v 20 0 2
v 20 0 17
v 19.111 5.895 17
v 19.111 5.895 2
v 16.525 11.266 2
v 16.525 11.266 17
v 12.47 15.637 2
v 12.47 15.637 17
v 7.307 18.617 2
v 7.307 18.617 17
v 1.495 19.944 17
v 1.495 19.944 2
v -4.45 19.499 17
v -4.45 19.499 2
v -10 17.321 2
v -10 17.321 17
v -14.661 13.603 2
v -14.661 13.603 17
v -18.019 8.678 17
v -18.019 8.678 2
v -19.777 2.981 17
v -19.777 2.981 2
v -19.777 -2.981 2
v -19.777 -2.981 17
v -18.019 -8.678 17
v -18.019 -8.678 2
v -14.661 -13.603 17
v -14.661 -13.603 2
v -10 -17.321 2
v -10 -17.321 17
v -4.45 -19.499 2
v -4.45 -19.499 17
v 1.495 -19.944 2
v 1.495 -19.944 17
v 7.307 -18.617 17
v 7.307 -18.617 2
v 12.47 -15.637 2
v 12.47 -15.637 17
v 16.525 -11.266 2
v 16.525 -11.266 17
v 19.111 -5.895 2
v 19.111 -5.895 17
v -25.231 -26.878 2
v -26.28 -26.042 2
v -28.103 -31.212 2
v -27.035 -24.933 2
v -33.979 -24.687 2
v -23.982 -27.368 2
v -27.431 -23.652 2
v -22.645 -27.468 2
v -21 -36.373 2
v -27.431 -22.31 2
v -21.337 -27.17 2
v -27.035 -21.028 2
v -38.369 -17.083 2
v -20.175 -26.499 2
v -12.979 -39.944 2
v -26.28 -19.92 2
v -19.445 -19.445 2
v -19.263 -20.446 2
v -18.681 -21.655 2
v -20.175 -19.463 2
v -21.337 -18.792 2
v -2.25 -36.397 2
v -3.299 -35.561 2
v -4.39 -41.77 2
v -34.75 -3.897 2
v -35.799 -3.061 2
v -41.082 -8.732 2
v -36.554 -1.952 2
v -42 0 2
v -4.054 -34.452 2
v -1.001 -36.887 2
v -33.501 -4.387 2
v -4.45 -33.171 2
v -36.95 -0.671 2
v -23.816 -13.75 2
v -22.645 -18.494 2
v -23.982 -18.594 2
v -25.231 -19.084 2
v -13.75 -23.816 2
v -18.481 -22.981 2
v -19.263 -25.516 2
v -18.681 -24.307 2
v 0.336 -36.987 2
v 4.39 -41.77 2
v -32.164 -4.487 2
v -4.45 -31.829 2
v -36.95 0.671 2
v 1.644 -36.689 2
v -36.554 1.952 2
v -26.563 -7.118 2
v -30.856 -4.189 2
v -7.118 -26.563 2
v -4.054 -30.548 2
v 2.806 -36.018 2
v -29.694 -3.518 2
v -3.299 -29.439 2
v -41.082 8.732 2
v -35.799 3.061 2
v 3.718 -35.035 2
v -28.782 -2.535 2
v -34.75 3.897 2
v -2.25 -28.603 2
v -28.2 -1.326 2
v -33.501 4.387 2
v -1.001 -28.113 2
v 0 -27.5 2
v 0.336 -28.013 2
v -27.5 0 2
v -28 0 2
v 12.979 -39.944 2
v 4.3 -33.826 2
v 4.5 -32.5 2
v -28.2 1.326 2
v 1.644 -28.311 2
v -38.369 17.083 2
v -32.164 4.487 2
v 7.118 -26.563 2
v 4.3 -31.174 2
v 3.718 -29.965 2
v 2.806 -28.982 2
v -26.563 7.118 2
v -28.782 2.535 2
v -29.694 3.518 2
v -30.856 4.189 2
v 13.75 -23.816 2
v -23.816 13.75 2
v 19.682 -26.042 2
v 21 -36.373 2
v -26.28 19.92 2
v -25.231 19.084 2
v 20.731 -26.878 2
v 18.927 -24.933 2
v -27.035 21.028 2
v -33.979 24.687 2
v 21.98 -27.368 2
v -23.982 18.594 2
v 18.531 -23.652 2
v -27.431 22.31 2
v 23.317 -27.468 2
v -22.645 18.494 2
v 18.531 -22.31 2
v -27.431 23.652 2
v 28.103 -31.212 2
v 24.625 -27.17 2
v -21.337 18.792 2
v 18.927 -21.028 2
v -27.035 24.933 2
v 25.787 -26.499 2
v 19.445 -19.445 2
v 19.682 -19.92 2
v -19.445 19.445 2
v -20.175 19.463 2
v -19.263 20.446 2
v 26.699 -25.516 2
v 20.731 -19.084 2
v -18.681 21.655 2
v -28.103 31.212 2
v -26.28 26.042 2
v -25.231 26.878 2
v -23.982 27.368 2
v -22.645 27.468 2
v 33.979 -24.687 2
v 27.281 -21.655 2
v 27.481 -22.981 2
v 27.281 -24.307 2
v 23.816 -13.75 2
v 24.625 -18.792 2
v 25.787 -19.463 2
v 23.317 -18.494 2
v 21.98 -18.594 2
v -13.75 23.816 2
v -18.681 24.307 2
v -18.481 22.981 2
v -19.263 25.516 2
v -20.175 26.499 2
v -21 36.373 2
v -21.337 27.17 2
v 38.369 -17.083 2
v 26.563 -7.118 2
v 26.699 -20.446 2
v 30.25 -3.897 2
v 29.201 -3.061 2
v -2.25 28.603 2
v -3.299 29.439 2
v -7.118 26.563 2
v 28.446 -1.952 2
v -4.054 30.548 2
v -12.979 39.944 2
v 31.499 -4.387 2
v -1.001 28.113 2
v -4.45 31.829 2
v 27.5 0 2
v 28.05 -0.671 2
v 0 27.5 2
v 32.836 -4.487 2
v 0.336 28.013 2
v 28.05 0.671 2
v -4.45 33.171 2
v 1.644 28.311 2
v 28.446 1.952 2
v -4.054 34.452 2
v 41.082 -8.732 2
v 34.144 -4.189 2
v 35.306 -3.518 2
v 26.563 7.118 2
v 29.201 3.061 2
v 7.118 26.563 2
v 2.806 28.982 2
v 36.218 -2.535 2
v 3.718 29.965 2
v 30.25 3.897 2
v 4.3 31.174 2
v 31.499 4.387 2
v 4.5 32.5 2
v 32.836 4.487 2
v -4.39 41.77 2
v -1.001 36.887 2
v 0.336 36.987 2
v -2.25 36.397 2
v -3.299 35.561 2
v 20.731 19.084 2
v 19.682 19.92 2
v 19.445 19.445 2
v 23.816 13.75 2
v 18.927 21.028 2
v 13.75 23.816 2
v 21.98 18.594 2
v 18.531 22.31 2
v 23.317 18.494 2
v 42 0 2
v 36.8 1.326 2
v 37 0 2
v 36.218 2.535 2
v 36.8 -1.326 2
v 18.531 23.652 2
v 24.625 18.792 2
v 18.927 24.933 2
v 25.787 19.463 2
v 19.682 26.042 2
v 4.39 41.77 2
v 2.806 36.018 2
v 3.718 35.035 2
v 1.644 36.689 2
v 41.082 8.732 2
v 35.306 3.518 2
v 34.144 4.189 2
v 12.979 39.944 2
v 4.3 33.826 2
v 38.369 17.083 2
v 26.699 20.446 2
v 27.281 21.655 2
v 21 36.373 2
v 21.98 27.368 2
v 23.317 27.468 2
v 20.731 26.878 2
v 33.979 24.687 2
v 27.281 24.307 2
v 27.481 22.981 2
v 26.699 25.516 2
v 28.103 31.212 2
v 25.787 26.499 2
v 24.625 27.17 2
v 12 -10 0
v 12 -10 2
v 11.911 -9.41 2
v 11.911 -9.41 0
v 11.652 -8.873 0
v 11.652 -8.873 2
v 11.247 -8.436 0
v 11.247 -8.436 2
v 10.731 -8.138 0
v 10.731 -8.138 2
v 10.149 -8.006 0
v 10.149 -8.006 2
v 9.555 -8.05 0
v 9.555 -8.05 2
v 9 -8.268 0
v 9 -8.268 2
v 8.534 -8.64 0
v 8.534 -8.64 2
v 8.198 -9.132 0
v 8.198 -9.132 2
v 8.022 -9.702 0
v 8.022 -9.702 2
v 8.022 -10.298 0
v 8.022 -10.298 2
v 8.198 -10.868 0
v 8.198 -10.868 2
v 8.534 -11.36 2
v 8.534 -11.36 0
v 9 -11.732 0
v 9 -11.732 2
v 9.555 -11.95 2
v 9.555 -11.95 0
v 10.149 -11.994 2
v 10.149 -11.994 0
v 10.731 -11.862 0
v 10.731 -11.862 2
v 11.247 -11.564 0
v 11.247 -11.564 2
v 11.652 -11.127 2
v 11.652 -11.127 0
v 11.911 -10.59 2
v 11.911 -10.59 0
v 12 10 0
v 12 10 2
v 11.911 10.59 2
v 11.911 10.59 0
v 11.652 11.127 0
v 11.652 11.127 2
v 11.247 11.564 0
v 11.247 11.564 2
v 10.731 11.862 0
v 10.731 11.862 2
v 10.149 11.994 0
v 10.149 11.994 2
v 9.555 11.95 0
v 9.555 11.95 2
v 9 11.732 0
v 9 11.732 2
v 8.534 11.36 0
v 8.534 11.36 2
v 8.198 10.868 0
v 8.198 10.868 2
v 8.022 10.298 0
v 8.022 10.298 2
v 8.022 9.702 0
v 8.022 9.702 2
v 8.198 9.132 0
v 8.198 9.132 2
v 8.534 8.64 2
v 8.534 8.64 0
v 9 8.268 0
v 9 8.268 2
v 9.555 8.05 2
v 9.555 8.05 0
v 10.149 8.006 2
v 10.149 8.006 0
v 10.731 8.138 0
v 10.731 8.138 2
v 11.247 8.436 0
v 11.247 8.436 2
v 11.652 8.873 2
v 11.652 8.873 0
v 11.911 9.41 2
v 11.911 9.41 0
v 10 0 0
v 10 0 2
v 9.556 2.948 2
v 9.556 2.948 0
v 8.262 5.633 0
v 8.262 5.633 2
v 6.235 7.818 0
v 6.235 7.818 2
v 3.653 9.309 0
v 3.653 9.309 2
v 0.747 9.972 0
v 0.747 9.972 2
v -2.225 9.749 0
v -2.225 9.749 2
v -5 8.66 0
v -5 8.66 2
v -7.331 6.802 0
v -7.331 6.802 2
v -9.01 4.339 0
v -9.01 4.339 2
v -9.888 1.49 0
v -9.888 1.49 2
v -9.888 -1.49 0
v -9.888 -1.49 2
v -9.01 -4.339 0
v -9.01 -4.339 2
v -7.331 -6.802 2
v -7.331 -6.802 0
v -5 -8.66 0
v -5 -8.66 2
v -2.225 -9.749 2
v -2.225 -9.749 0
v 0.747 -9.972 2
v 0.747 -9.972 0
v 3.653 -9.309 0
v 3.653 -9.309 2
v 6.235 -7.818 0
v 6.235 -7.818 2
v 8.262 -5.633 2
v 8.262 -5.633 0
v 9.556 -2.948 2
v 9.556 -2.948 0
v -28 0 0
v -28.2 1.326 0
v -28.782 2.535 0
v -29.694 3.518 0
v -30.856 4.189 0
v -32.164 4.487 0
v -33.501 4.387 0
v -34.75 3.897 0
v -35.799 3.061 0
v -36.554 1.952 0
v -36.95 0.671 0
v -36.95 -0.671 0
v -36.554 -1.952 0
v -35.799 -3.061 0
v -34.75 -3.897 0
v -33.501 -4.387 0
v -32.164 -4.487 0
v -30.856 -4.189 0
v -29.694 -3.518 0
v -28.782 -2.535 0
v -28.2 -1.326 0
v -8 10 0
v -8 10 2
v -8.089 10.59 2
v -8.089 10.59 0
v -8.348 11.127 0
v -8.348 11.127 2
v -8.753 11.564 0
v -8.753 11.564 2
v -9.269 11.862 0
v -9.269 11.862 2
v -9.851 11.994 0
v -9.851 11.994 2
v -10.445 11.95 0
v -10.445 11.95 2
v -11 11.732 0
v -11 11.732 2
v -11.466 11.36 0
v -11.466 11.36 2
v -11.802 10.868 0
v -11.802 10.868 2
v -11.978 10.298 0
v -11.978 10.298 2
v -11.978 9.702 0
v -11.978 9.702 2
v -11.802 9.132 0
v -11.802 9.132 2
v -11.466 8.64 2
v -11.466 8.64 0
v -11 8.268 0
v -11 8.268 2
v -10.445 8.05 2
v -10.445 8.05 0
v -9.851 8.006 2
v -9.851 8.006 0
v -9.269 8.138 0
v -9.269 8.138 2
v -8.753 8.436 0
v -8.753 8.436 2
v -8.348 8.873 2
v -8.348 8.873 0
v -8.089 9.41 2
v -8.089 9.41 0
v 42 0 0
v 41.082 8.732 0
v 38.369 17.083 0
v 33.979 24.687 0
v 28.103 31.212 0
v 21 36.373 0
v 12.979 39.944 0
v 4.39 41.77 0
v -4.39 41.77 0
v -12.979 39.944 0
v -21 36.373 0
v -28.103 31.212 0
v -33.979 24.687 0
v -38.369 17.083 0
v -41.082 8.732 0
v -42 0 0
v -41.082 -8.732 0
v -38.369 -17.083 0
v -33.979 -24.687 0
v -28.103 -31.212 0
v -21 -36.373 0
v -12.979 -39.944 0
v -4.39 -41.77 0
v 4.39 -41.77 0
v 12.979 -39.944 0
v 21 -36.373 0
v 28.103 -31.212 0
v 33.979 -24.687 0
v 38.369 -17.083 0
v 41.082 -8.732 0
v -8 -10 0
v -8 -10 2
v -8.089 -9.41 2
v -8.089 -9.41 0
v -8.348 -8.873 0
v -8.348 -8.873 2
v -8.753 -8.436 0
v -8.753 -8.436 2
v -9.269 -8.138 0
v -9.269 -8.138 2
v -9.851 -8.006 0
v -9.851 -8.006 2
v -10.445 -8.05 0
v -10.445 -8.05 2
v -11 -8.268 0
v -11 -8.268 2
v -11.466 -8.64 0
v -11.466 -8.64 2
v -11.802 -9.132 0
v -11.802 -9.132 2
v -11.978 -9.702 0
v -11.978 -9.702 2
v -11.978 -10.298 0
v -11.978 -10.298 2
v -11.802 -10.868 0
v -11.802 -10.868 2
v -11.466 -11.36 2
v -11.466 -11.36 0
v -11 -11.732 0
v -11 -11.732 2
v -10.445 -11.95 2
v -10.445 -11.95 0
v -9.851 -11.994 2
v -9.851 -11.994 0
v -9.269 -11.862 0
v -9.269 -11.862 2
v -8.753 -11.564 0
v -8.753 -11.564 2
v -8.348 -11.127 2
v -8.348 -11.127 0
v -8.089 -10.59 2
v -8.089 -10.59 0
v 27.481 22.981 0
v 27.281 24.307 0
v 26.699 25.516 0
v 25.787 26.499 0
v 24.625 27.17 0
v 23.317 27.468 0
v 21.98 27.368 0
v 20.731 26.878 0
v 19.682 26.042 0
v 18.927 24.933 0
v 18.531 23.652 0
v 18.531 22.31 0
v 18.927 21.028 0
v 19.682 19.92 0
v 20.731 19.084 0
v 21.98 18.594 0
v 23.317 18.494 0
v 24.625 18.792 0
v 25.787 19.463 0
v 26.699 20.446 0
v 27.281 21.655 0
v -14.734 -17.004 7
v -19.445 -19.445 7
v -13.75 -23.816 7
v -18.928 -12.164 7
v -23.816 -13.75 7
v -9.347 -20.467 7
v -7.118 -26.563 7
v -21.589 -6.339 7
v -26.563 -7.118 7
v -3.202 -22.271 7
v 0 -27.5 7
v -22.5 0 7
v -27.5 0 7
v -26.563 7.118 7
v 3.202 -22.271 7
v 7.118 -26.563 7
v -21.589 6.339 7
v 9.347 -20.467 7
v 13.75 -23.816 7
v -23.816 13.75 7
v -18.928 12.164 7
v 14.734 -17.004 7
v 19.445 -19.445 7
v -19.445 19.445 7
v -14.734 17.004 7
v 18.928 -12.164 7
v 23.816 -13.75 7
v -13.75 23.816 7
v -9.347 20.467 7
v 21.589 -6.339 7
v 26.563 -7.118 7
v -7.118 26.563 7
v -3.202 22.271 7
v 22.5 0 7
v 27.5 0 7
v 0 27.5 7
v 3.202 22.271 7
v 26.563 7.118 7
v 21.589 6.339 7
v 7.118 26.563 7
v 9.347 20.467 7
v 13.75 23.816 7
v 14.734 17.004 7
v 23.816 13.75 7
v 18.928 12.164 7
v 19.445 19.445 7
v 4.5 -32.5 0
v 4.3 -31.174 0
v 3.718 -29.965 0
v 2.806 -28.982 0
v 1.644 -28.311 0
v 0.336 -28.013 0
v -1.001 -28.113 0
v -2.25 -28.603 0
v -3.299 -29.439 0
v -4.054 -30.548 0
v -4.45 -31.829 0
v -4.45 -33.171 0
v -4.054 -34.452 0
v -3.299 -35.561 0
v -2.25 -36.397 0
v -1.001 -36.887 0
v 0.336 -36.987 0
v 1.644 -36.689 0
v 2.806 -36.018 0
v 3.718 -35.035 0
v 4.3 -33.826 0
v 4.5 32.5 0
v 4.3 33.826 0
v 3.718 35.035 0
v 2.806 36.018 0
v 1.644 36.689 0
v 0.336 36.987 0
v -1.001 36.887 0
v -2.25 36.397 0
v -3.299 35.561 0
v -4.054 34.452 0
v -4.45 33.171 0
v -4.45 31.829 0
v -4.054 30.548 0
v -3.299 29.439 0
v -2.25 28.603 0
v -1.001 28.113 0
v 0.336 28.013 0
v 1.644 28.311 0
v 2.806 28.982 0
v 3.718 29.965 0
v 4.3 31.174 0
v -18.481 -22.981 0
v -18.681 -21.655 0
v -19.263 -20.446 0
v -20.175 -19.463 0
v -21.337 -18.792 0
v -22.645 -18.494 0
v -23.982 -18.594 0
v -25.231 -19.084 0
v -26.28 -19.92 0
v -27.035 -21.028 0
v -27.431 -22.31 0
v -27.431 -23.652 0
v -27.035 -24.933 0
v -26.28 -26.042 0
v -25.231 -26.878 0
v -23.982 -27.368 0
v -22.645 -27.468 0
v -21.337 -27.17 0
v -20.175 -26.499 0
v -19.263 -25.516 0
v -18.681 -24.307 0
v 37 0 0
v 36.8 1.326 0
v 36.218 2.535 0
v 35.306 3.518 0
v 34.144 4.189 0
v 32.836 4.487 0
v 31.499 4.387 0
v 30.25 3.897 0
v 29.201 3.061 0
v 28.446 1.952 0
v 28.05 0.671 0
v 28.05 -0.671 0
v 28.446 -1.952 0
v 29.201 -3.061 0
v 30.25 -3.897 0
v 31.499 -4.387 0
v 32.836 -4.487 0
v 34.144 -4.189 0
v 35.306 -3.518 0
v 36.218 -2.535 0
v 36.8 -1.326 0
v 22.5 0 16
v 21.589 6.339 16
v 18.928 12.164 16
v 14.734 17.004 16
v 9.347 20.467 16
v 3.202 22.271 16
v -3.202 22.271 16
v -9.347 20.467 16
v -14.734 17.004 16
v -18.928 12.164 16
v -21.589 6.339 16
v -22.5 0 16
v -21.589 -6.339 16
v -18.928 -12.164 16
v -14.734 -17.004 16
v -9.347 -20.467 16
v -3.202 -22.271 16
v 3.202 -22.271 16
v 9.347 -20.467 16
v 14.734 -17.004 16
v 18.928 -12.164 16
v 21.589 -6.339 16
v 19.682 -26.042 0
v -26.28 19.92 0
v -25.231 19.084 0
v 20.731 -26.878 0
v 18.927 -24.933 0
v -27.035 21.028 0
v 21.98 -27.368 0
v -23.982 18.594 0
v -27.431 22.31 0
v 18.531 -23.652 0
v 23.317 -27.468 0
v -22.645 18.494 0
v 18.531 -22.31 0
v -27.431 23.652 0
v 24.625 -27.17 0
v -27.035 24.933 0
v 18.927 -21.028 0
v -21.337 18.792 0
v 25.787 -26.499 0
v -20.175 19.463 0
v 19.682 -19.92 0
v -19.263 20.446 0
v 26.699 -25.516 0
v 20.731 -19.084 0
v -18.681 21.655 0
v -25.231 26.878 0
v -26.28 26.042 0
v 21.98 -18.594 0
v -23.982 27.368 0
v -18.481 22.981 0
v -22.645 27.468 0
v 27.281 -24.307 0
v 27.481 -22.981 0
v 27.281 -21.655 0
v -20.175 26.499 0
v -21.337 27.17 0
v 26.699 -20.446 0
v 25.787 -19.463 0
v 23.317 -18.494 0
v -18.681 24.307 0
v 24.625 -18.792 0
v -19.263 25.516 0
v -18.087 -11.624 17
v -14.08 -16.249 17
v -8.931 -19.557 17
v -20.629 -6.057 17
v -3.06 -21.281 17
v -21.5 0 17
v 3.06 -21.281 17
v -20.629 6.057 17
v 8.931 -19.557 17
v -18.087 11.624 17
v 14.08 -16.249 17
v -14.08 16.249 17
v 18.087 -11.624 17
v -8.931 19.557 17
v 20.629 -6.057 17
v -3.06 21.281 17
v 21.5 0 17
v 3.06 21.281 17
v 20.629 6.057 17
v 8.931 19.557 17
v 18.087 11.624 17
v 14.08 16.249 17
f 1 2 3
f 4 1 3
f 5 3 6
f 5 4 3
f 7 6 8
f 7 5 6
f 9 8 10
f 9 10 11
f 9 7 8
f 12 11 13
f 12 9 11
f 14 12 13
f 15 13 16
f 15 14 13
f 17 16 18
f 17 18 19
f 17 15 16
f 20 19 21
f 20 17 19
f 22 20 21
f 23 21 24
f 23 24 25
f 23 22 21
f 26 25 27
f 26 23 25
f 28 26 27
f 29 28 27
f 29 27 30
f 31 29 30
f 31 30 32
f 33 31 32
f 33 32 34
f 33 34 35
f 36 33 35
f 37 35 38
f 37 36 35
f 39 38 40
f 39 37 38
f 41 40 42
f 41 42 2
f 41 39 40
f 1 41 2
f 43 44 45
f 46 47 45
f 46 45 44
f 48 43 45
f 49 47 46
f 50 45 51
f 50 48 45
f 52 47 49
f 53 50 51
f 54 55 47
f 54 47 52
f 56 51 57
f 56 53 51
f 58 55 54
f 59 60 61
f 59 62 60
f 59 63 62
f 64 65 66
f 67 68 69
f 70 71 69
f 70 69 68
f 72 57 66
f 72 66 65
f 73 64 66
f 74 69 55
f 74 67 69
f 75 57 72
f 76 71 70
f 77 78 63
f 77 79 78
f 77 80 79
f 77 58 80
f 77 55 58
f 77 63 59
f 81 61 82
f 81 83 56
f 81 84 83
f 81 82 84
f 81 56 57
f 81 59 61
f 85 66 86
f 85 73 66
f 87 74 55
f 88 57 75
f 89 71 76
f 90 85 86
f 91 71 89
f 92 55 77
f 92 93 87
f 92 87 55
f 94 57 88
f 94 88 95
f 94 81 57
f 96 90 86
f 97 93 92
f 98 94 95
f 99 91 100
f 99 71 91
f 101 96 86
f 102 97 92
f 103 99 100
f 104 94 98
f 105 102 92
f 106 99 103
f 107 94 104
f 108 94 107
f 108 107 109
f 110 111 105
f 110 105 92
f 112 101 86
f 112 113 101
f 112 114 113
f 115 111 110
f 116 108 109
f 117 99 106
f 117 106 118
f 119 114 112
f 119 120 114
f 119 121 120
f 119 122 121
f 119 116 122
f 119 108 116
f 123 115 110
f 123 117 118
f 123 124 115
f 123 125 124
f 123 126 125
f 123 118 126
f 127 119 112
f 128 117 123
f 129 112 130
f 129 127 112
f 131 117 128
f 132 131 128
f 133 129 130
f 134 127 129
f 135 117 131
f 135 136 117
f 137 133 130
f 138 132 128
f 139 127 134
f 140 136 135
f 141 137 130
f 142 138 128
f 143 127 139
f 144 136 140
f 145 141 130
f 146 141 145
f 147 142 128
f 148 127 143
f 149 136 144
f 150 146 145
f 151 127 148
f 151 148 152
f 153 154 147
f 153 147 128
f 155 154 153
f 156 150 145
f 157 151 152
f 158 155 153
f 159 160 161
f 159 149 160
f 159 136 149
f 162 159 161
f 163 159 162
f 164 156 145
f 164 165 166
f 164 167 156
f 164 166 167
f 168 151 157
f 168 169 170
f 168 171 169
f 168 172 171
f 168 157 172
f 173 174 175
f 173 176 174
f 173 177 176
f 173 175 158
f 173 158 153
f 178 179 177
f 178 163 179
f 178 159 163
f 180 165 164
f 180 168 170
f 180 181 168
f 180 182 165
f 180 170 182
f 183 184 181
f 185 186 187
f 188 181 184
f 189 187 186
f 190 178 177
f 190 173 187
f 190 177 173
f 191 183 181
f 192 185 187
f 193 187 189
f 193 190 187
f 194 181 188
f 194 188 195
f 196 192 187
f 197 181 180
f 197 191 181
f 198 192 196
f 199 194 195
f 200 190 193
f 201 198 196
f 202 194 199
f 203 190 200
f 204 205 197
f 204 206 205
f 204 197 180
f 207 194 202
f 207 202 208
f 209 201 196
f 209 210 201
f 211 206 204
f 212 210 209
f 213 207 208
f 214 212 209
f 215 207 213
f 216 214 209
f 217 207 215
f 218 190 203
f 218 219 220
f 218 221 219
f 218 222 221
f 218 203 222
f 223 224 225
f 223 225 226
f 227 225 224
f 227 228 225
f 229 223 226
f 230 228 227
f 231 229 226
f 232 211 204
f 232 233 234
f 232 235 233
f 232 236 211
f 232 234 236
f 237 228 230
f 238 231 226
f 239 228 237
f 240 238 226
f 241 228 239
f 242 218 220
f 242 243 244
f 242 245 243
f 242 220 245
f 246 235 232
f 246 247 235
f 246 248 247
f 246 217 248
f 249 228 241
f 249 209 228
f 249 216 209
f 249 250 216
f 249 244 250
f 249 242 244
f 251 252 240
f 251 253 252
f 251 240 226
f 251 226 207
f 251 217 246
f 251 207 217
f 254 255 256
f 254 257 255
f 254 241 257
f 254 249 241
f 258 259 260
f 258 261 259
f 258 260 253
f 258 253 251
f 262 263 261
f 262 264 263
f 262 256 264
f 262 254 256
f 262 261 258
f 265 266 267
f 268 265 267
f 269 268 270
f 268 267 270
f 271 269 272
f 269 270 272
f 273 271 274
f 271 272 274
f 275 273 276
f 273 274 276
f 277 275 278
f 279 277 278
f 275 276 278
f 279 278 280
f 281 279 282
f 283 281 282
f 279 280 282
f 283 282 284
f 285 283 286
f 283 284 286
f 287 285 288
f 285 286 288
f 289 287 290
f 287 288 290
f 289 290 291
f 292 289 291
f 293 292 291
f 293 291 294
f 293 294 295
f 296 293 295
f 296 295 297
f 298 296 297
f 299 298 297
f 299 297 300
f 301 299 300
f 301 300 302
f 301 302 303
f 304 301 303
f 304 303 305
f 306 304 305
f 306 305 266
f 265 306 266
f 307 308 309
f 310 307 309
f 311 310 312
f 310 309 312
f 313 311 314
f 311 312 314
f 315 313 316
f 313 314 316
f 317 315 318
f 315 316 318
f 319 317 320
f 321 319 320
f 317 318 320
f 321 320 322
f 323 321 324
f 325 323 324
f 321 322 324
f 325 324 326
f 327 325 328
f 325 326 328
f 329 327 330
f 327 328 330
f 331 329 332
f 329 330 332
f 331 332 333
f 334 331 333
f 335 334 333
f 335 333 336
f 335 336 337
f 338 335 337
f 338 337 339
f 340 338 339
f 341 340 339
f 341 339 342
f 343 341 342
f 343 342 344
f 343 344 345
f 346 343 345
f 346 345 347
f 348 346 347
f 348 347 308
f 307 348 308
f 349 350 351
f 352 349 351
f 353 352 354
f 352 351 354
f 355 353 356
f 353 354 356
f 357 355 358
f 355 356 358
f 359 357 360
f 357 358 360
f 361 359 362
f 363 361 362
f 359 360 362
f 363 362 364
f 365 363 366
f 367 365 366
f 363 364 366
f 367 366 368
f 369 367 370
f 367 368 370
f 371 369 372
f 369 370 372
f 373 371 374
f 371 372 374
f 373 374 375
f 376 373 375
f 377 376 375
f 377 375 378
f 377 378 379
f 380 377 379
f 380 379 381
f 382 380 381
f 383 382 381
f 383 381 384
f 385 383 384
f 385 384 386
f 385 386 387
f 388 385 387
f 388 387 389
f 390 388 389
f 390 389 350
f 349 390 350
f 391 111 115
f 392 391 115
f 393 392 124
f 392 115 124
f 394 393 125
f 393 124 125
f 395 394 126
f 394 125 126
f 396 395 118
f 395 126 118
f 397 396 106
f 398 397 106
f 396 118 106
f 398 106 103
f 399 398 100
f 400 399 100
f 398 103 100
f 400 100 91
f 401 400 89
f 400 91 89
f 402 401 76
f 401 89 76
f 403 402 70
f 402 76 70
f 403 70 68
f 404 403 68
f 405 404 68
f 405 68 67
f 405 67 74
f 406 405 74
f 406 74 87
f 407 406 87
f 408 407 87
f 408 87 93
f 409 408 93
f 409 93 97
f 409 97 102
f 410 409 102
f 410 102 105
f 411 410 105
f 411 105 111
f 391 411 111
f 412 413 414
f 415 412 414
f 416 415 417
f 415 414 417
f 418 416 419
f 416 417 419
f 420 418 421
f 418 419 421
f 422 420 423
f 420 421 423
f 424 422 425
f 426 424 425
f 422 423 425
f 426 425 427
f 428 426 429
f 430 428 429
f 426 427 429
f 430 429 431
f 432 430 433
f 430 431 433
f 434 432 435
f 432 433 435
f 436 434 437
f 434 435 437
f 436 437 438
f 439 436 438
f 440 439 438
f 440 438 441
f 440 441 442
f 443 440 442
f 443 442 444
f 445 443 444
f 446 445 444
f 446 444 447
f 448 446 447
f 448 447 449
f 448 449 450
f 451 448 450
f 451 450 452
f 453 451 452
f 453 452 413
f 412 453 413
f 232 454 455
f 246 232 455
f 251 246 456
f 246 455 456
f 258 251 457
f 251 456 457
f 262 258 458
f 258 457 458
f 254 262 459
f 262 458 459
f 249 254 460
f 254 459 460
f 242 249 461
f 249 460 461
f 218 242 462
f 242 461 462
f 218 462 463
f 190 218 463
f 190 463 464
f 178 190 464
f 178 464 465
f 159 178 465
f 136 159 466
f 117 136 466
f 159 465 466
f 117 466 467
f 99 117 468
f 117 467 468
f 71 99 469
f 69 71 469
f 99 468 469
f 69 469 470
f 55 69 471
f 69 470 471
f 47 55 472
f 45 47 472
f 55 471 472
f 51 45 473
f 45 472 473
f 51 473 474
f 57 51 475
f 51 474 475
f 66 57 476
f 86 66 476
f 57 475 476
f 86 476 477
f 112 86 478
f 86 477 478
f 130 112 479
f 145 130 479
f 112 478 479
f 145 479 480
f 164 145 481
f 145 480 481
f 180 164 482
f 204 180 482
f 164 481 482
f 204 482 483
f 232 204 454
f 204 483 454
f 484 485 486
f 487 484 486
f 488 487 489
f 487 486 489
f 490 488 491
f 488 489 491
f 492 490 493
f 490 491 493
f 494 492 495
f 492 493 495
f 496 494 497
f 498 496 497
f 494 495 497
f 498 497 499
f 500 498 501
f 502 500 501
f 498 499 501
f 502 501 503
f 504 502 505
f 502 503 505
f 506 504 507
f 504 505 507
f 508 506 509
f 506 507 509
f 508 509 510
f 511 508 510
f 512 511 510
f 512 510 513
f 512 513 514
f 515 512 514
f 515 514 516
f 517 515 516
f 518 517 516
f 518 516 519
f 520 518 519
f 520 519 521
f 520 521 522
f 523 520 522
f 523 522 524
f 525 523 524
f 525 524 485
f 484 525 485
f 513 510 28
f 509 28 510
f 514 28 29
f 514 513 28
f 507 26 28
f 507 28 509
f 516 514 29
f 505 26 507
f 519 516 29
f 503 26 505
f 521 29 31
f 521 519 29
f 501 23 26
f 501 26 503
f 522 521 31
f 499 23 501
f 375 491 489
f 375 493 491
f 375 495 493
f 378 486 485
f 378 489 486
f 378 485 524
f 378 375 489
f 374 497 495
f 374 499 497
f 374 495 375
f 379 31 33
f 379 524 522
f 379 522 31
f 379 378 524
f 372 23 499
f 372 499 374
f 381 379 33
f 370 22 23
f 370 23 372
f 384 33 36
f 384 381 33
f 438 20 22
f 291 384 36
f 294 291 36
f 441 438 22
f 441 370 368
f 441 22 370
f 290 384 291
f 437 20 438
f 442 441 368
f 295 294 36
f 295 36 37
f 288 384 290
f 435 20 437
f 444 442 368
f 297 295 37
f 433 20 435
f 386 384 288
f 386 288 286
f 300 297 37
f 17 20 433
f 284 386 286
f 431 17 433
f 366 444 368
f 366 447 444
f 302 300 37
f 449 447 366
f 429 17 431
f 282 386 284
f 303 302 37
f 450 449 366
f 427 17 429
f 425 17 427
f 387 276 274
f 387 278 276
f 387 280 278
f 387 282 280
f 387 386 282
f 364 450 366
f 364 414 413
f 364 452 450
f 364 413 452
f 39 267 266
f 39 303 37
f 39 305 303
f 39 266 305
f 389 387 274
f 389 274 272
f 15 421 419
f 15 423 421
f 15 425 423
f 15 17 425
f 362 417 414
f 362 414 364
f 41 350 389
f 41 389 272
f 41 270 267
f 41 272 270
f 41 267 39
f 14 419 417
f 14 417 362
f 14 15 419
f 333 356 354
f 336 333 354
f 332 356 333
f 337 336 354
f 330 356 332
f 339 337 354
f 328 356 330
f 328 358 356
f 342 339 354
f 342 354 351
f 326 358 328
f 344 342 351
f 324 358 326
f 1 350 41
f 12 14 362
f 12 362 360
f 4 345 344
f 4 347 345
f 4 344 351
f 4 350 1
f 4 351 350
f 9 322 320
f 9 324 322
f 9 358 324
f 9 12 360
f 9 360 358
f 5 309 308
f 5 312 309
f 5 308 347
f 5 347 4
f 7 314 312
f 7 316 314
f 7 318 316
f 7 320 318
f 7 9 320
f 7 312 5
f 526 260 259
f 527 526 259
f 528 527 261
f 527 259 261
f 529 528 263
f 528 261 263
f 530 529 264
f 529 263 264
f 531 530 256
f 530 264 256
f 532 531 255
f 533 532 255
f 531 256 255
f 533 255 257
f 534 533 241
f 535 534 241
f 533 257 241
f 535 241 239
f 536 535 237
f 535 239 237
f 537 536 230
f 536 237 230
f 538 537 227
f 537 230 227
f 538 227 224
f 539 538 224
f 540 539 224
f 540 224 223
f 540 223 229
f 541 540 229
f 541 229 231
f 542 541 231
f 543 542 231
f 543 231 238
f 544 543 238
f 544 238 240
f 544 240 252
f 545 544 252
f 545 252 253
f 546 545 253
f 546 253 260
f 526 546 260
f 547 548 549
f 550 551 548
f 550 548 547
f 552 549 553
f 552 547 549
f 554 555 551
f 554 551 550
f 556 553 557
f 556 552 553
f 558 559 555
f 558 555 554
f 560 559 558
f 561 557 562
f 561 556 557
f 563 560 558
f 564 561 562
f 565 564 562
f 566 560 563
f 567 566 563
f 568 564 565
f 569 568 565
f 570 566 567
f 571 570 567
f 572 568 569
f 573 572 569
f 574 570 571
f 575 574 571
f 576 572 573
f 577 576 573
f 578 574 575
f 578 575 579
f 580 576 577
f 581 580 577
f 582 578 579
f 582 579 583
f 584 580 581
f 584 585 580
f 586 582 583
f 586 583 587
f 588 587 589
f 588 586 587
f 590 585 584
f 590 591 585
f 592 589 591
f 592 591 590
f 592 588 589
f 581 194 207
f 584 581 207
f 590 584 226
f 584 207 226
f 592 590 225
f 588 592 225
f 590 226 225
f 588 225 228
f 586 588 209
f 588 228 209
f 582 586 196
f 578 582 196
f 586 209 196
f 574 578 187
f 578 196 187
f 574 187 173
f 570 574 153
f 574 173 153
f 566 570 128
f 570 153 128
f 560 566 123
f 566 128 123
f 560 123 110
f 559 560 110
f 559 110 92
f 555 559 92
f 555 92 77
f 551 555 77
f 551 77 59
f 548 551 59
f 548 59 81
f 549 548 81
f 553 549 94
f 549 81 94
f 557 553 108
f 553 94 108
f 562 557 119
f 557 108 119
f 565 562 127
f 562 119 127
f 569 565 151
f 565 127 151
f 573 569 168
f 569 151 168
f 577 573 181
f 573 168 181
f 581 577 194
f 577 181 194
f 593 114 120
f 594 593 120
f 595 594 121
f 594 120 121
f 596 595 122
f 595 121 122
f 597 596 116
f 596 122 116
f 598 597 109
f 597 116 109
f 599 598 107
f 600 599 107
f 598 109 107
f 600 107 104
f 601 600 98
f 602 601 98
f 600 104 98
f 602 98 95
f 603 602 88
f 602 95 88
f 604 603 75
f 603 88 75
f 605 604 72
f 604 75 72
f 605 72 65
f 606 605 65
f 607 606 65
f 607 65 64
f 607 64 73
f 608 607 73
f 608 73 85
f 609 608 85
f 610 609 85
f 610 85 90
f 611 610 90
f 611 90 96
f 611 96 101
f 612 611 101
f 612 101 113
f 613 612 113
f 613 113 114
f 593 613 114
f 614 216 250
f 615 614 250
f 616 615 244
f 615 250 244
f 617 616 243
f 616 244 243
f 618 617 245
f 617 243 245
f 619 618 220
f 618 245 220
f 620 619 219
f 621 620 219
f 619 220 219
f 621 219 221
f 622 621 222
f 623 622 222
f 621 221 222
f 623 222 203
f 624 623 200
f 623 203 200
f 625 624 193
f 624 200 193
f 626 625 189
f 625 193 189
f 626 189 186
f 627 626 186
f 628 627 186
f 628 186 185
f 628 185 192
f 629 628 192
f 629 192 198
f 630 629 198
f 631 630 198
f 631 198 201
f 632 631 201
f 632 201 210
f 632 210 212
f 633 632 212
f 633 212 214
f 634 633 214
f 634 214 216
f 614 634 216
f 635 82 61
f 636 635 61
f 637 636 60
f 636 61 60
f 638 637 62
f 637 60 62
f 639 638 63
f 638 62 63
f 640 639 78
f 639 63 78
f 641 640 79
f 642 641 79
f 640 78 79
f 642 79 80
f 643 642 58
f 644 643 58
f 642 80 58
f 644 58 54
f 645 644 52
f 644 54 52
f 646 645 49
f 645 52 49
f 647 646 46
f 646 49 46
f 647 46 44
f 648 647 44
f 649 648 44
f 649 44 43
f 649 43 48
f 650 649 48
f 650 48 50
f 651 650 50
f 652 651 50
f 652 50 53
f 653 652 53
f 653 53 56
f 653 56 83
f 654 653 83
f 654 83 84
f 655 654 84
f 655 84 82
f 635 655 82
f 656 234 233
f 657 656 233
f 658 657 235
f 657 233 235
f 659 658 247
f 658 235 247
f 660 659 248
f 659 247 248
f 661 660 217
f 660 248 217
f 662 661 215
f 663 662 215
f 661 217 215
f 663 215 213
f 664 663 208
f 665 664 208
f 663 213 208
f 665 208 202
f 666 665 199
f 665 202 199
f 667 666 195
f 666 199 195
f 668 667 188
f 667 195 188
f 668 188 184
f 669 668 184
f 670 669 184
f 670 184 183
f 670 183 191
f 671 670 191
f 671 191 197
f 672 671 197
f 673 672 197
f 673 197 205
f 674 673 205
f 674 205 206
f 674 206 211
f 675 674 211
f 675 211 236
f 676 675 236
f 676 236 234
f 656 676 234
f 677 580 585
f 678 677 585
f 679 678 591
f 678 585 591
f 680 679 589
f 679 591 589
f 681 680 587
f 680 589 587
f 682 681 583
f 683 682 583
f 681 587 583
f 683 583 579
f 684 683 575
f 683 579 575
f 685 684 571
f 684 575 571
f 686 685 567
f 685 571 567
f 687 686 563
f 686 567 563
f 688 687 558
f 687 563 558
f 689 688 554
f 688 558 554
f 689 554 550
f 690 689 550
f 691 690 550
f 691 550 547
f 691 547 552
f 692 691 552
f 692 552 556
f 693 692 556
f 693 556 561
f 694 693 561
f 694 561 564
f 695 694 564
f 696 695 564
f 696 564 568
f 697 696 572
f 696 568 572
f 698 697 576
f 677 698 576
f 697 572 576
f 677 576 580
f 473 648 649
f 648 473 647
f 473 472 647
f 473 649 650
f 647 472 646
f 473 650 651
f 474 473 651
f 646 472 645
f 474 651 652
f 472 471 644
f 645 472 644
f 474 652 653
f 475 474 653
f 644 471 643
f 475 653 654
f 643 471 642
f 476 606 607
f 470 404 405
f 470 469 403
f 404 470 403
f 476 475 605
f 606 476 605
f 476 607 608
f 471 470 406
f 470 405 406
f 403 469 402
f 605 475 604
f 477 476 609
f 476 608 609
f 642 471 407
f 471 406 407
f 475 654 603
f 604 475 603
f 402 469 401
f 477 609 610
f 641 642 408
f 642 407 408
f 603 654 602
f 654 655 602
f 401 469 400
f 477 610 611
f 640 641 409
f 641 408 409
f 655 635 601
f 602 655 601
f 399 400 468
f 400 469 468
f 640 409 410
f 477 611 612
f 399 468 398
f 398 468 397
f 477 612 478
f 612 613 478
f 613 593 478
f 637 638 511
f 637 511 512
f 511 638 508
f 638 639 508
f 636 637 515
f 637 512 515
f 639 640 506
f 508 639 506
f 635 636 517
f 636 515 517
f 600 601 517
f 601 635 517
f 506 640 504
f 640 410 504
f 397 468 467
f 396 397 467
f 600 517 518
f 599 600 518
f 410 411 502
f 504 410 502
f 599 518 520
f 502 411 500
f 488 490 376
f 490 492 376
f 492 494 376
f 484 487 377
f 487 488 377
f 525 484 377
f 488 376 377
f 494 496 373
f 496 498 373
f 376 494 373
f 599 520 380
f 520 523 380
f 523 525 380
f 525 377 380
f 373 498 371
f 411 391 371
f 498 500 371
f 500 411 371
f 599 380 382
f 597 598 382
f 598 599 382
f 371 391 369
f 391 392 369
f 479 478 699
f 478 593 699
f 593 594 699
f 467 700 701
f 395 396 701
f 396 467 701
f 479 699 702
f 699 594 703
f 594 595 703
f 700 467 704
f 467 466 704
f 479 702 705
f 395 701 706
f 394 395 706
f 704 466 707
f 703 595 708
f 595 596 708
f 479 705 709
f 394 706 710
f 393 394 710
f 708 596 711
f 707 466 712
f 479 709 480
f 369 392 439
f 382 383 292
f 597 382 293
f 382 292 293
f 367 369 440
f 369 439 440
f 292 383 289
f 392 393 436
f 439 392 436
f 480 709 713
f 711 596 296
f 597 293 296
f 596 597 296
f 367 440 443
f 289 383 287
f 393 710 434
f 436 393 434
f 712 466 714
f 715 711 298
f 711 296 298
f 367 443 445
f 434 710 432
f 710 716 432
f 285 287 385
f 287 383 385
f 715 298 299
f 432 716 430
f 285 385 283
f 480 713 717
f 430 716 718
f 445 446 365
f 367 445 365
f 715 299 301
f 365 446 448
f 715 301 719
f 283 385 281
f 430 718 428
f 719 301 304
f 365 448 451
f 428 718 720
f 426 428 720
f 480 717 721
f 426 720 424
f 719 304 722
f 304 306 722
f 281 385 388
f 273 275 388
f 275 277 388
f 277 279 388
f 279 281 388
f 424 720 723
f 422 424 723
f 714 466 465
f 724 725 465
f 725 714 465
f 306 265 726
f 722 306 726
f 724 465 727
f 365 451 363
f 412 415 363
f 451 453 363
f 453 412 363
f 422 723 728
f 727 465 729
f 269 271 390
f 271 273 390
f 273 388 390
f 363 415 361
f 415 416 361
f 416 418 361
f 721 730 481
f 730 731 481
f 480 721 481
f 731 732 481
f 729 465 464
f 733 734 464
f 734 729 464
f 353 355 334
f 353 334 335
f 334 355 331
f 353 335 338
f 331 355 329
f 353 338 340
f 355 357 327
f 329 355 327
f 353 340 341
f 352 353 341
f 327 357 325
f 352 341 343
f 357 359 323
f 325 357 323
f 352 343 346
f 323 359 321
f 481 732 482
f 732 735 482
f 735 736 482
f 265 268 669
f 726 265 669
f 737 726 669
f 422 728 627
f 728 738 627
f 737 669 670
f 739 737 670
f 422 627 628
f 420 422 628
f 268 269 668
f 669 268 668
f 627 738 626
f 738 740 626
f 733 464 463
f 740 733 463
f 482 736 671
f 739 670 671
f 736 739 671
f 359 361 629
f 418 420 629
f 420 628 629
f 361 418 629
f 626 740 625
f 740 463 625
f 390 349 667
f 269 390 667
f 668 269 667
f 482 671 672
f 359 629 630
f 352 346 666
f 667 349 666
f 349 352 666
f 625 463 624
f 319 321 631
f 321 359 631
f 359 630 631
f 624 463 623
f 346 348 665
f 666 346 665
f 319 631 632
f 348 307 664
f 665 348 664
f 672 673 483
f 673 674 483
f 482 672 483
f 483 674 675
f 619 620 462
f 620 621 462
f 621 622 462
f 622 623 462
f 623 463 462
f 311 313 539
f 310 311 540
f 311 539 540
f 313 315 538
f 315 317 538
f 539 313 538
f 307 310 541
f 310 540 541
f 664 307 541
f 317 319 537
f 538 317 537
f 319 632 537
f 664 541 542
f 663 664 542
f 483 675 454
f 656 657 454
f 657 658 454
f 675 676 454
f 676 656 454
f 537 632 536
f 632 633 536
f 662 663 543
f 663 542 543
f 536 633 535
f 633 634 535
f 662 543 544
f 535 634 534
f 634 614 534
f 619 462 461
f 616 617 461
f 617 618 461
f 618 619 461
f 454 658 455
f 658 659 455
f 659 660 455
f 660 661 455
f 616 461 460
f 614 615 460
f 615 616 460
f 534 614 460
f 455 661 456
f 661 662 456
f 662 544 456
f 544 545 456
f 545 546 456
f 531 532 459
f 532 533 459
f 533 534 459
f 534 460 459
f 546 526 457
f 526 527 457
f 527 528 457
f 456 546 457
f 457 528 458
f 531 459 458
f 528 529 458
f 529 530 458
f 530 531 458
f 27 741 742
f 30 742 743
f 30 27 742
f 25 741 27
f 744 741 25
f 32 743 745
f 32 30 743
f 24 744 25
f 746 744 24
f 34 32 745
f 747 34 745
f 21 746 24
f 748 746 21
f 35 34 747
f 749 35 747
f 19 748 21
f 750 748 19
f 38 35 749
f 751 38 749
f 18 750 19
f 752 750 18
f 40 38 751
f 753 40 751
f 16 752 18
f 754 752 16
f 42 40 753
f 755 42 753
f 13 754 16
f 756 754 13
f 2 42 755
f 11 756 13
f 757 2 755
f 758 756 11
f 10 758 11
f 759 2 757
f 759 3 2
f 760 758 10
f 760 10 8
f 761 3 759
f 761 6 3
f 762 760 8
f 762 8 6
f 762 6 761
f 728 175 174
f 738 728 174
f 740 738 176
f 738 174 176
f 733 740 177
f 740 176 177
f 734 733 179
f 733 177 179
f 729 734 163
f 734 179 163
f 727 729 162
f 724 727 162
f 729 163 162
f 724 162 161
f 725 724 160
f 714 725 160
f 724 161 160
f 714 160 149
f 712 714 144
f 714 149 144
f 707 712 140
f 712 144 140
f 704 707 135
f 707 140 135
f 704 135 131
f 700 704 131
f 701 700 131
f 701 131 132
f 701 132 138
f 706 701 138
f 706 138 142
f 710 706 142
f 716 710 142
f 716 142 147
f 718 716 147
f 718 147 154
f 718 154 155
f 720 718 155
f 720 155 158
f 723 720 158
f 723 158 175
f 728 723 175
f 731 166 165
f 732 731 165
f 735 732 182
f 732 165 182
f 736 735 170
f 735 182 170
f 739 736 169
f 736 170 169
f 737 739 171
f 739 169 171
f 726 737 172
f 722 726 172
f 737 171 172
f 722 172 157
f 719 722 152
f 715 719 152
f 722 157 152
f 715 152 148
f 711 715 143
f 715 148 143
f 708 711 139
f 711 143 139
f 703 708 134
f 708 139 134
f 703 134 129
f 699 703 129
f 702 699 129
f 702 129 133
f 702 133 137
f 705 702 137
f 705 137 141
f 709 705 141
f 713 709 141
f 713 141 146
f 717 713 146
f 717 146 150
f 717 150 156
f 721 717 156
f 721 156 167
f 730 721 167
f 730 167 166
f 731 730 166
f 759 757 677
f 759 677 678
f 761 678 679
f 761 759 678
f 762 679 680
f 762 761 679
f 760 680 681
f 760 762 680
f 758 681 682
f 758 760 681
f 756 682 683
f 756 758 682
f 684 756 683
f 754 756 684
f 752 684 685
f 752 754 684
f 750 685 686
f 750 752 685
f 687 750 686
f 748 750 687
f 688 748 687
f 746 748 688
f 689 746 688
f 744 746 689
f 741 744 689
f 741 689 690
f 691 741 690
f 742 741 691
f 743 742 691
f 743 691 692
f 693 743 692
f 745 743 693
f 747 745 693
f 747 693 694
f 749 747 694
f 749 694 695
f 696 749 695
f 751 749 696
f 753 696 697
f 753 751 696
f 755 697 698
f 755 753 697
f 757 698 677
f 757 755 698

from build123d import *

# Parameters (mm, degrees)
SKETCH_R        = 42
PAD_DEPTH       = 2
SKETCH001_R     = 27.5
SKETCH001_R_2   = 20
PAD001_DEPTH    = 5
SKETCH002_R     = 22.5
SKETCH002_R_2   = 20
PAD002_DEPTH    = 10
CHAMFER_SIZE    = 1
SKETCH003_R     = 2
POCKET_DEPTH    = 2.001
SKETCH004_R     = 10
POCKET001_DEPTH = 5
SKETCH005_R     = 4.5
POCKET002_DEPTH = 2.001


with BuildPart() as part:
    # Sketch → Pad (new body)
    with BuildSketch(Plane.XY):
        Circle(SKETCH_R)
    extrude(amount=PAD_DEPTH)

    # Sketch001 (on Face3 of Pad) → Pad001 (join)
    with BuildSketch(Plane.XY.offset(2)):
        Circle(SKETCH001_R)
        Circle(SKETCH001_R_2, mode=Mode.SUBTRACT)
    extrude(amount=PAD001_DEPTH)

    # Sketch002 (on Face5 of Pad001) → Pad002 (join)
    with BuildSketch(Plane.XY.offset(7)):
        Circle(SKETCH002_R)
        Circle(SKETCH002_R_2, mode=Mode.SUBTRACT)
    extrude(amount=PAD002_DEPTH)

    # Chamfer
    chamfer_edges = [part.edges().sort_by_distance(p)[0] for p in [
        (-22.5, 0, 17),
    ]]
    chamfer(chamfer_edges, length=CHAMFER_SIZE)

    # Sketch003 (on Face10 of Chamfer) → Pocket (cut, through all)
    with BuildSketch(Plane.XY.offset(2)):
        with Locations((-10, 10)):
            Circle(SKETCH003_R)
        with Locations((10, 10)):
            Circle(SKETCH003_R)
        with Locations((10, -10)):
            Circle(SKETCH003_R)
        with Locations((-10, -10)):
            Circle(SKETCH003_R)
    extrude(amount=-POCKET_DEPTH, mode=Mode.SUBTRACT)

    # Sketch004 (on Face10 of Pocket) → Pocket001 (cut)
    with BuildSketch(Plane.XY.offset(2)):
        Circle(SKETCH004_R)
    extrude(amount=-POCKET001_DEPTH, mode=Mode.SUBTRACT)

    # Sketch005 (on Face7 of Pocket001) → Pocket002 (cut, through all)
    with BuildSketch(Plane.XY.offset(2)):
        with Locations((-22.98097, 22.98097)):
            Circle(SKETCH005_R)
        with Locations((0, 32.5)):
            Circle(SKETCH005_R)
        with Locations((22.98097, 22.98097)):
            Circle(SKETCH005_R)
        with Locations((32.5, 0)):
            Circle(SKETCH005_R)
        with Locations((-32.5, 0)):
            Circle(SKETCH005_R)
        with Locations((-22.98097, -22.98097)):
            Circle(SKETCH005_R)
        with Locations((0, -32.5)):
            Circle(SKETCH005_R)
        with Locations((22.98097, -22.98097)):
            Circle(SKETCH005_R)
    extrude(amount=-POCKET002_DEPTH, mode=Mode.SUBTRACT)


solid = part.part
